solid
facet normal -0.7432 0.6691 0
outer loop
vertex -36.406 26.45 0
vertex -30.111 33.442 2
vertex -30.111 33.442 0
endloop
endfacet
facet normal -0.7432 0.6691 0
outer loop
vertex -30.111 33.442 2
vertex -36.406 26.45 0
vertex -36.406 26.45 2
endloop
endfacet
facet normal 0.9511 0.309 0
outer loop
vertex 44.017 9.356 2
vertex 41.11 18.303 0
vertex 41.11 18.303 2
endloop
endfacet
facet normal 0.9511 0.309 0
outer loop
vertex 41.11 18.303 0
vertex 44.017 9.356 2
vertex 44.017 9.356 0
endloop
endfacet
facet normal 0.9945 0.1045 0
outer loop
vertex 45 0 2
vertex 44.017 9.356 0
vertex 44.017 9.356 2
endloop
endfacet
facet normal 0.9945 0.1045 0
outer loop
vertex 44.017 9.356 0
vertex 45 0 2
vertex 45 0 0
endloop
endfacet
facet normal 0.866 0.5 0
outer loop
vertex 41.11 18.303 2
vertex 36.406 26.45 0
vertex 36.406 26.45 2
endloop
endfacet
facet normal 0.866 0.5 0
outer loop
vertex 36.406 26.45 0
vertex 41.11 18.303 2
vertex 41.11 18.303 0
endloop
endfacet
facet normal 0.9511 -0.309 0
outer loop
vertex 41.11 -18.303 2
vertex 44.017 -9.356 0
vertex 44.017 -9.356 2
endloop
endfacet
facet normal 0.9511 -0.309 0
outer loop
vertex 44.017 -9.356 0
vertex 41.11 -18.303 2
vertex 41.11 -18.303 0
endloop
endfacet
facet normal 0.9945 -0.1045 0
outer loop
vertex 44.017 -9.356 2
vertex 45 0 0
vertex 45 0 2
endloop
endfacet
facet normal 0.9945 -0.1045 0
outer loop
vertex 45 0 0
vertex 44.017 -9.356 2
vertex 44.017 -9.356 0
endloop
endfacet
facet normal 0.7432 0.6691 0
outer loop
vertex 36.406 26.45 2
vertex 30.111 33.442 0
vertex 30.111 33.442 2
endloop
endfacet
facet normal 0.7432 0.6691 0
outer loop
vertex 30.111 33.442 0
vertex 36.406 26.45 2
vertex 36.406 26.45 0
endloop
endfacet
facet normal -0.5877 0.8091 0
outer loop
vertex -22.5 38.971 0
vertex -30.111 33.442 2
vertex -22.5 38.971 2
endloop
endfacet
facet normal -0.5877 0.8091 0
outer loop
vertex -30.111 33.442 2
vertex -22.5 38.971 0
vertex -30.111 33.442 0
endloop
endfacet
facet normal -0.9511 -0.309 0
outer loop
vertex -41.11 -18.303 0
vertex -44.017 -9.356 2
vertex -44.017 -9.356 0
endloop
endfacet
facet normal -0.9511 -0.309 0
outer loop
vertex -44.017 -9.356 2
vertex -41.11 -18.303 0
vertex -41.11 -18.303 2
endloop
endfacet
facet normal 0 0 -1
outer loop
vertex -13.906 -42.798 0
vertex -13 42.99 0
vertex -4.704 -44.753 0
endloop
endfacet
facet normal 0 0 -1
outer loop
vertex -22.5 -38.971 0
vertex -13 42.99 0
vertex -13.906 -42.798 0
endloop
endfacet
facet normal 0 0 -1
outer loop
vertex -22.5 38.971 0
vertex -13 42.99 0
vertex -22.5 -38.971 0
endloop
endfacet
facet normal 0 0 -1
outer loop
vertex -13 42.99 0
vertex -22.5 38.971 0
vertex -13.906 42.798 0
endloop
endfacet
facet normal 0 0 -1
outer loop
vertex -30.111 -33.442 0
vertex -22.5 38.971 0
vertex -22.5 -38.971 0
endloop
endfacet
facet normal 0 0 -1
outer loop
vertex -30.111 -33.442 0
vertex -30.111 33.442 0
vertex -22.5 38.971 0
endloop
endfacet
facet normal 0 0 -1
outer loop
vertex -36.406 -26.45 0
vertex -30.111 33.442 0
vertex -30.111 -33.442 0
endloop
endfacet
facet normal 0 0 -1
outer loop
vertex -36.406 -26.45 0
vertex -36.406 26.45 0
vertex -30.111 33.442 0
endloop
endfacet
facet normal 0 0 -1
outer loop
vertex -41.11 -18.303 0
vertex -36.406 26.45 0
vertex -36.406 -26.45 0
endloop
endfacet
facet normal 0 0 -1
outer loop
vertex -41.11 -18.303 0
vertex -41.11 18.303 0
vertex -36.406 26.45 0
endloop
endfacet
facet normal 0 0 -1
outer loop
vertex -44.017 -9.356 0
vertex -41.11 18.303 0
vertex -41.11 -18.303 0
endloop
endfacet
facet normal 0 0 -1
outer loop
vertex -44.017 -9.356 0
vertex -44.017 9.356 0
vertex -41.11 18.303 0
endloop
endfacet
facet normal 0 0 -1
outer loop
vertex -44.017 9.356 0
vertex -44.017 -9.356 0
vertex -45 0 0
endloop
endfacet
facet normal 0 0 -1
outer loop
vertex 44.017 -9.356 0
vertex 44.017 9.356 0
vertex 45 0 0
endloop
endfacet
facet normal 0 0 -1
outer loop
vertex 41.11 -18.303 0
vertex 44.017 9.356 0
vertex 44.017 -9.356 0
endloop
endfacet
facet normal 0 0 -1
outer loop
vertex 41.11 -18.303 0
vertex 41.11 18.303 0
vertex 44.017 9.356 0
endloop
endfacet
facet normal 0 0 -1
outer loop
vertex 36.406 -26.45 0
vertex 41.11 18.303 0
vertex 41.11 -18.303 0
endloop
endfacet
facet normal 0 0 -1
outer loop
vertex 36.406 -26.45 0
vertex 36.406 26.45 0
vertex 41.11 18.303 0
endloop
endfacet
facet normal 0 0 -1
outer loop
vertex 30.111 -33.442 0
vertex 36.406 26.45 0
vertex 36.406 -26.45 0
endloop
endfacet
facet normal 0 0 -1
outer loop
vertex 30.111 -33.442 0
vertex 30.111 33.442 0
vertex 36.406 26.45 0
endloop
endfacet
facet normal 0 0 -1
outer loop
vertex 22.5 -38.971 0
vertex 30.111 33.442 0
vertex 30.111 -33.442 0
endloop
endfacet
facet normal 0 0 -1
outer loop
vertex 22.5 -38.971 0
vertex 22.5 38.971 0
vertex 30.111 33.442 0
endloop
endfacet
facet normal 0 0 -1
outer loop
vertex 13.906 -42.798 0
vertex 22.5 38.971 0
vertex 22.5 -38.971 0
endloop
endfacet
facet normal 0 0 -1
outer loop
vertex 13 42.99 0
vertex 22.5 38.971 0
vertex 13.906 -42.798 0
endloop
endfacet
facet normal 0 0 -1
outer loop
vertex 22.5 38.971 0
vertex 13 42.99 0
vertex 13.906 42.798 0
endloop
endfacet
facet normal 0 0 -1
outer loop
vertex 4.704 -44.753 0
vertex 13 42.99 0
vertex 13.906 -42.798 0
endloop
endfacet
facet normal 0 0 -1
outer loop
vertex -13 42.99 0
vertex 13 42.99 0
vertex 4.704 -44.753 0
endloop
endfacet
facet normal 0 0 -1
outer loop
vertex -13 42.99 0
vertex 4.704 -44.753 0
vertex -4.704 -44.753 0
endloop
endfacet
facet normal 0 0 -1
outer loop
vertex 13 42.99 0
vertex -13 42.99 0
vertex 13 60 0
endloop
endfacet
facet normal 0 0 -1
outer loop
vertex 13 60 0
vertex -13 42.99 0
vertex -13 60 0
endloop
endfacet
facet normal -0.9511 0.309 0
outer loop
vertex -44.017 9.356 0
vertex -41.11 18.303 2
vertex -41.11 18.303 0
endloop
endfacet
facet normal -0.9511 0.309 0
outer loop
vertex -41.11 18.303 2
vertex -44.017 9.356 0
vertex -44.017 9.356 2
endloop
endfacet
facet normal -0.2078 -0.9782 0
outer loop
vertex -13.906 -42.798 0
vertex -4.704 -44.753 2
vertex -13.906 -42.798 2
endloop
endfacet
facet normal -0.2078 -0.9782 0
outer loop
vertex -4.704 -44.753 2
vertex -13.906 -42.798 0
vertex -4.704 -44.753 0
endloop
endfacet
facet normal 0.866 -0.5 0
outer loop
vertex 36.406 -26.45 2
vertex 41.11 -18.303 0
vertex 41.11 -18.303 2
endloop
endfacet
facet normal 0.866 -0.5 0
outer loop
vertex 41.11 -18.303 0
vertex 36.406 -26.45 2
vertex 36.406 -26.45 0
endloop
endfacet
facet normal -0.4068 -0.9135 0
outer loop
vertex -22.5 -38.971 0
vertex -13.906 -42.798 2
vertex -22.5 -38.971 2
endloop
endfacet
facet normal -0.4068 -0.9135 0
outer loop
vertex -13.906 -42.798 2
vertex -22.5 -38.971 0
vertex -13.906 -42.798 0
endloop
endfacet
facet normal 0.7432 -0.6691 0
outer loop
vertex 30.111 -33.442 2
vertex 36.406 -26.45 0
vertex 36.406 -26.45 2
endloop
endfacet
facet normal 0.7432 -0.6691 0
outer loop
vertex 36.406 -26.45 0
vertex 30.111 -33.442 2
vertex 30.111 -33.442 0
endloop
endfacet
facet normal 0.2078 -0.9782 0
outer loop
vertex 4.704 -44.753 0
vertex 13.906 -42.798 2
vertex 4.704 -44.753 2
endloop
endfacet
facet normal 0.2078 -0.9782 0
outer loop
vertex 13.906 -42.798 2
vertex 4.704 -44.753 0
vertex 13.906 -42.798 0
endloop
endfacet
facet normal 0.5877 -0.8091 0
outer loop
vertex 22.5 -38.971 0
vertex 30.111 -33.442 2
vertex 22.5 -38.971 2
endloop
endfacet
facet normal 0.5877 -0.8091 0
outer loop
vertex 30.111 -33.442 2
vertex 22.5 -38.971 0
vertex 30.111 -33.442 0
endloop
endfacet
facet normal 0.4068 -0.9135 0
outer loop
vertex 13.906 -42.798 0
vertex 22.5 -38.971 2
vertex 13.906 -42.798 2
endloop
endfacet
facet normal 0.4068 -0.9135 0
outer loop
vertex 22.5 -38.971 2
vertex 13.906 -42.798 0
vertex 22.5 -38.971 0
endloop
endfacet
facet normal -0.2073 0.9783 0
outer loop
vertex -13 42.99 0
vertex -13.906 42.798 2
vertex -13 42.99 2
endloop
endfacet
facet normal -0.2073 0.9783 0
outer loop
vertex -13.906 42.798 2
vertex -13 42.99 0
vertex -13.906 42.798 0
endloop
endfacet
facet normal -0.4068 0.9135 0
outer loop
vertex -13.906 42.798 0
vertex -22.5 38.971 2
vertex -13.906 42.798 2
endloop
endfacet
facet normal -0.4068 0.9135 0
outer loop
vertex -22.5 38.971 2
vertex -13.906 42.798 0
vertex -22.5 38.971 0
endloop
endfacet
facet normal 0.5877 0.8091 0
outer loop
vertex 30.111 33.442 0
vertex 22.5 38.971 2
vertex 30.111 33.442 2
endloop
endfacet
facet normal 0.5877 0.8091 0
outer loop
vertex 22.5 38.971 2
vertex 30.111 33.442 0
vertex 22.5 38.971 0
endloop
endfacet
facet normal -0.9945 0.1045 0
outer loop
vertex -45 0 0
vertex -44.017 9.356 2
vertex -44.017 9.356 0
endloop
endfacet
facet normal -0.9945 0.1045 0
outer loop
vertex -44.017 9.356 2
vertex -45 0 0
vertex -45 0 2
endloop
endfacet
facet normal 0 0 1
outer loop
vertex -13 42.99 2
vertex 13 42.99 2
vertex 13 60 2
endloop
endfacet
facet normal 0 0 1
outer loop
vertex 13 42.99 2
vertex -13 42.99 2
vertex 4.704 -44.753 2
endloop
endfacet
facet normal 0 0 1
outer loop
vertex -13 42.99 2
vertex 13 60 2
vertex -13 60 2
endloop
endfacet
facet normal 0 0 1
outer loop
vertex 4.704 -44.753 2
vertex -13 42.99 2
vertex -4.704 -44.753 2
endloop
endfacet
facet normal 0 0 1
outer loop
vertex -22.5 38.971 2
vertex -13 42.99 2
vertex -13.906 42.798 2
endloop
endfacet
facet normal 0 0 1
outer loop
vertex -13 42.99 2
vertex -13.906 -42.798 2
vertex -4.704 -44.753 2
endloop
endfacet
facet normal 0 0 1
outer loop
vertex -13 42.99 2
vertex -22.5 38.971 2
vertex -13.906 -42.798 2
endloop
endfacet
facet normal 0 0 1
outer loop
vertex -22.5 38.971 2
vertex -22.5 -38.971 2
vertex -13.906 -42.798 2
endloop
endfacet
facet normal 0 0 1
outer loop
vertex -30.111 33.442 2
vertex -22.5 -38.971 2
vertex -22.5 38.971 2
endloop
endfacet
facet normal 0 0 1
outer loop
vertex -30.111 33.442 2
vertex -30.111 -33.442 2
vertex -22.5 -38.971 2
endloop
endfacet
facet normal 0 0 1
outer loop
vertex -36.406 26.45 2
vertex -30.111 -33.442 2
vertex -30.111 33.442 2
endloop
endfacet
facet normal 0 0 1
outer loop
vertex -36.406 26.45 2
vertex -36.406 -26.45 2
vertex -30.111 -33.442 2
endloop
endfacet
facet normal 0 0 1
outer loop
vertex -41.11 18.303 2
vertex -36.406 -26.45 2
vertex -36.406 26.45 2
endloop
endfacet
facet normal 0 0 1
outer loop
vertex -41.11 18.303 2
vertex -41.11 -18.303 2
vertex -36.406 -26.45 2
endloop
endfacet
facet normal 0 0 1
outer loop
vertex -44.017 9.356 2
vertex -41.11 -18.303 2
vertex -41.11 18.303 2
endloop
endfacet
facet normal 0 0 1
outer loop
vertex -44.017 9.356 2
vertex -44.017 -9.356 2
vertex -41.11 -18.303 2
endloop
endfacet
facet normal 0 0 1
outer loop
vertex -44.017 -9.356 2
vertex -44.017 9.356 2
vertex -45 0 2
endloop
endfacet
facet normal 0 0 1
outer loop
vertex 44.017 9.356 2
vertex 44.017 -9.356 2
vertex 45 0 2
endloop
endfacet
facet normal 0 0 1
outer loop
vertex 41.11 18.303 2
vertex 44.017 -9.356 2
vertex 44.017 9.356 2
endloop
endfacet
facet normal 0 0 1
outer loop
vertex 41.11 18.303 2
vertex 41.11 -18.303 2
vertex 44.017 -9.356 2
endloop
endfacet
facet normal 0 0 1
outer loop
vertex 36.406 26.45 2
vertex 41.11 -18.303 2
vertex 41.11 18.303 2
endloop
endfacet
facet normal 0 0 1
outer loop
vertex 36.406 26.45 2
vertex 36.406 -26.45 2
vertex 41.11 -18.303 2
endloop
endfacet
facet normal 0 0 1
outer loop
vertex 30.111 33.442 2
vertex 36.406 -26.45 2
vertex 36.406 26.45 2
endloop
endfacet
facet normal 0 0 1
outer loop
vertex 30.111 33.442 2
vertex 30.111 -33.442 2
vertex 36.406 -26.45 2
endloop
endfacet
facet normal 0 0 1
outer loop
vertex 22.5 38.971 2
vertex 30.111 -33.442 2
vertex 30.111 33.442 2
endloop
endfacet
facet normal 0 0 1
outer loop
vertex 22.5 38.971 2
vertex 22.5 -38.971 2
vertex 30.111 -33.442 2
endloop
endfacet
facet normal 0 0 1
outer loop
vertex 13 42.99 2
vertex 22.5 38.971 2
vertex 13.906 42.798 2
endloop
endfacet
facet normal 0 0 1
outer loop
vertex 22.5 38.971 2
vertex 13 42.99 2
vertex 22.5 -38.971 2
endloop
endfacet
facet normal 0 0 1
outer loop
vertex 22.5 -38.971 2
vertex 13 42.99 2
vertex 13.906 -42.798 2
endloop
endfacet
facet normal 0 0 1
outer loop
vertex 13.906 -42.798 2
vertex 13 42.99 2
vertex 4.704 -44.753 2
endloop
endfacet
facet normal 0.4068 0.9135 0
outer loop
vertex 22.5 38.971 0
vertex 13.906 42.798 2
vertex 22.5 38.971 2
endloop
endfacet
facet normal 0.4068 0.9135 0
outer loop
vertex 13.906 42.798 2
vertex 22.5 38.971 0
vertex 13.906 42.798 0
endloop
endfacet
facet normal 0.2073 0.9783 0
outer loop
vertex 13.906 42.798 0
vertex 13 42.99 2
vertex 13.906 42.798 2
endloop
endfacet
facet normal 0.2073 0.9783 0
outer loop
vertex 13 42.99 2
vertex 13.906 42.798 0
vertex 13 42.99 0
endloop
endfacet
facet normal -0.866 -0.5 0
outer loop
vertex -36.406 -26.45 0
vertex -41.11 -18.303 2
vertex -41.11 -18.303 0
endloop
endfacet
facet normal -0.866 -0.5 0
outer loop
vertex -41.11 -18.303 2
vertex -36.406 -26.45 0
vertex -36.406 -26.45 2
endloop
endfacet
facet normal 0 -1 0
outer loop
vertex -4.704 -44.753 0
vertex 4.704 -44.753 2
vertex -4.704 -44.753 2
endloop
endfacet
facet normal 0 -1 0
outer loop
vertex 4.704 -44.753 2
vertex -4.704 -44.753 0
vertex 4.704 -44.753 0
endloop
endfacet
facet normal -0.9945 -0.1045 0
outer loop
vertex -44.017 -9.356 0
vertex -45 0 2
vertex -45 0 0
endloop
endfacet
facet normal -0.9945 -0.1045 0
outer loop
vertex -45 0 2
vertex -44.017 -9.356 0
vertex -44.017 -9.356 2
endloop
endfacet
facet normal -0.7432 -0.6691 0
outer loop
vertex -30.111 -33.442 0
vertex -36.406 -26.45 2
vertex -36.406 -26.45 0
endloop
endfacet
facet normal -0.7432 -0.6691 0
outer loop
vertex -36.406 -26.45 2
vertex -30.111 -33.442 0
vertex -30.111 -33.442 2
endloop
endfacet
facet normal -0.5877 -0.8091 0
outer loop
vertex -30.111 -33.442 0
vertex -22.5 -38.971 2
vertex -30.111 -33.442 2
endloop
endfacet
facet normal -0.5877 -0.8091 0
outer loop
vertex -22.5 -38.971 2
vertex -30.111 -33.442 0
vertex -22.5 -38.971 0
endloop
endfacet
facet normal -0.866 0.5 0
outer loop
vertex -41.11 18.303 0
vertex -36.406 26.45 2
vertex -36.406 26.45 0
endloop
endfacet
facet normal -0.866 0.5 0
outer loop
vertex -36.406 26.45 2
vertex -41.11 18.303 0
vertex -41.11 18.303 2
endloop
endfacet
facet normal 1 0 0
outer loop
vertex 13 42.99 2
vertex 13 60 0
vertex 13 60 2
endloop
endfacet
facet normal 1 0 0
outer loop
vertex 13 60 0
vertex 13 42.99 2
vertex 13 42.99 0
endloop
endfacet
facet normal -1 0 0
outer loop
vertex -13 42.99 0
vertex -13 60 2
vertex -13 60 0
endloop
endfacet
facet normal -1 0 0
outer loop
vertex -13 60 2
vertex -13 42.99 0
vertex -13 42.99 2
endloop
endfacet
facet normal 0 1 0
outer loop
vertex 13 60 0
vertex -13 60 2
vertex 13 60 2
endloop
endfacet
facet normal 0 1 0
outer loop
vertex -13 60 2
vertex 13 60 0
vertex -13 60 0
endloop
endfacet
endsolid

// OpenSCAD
medalRadius = 90/2;
medalThickness = 2;
medalHangWidth = 26;
medalHangHeight = 15;

module medalDummy() {
  color(c=[0.3,1,0.3]) {
    cylinder(h=2, r=medalRadius);
    translate(v=[-medalHangWidth/2, 0, 0]) 
    cube([medalHangWidth,medalHangHeight + medalRadius,medalThickness]);
  }
}

medalDummy();
